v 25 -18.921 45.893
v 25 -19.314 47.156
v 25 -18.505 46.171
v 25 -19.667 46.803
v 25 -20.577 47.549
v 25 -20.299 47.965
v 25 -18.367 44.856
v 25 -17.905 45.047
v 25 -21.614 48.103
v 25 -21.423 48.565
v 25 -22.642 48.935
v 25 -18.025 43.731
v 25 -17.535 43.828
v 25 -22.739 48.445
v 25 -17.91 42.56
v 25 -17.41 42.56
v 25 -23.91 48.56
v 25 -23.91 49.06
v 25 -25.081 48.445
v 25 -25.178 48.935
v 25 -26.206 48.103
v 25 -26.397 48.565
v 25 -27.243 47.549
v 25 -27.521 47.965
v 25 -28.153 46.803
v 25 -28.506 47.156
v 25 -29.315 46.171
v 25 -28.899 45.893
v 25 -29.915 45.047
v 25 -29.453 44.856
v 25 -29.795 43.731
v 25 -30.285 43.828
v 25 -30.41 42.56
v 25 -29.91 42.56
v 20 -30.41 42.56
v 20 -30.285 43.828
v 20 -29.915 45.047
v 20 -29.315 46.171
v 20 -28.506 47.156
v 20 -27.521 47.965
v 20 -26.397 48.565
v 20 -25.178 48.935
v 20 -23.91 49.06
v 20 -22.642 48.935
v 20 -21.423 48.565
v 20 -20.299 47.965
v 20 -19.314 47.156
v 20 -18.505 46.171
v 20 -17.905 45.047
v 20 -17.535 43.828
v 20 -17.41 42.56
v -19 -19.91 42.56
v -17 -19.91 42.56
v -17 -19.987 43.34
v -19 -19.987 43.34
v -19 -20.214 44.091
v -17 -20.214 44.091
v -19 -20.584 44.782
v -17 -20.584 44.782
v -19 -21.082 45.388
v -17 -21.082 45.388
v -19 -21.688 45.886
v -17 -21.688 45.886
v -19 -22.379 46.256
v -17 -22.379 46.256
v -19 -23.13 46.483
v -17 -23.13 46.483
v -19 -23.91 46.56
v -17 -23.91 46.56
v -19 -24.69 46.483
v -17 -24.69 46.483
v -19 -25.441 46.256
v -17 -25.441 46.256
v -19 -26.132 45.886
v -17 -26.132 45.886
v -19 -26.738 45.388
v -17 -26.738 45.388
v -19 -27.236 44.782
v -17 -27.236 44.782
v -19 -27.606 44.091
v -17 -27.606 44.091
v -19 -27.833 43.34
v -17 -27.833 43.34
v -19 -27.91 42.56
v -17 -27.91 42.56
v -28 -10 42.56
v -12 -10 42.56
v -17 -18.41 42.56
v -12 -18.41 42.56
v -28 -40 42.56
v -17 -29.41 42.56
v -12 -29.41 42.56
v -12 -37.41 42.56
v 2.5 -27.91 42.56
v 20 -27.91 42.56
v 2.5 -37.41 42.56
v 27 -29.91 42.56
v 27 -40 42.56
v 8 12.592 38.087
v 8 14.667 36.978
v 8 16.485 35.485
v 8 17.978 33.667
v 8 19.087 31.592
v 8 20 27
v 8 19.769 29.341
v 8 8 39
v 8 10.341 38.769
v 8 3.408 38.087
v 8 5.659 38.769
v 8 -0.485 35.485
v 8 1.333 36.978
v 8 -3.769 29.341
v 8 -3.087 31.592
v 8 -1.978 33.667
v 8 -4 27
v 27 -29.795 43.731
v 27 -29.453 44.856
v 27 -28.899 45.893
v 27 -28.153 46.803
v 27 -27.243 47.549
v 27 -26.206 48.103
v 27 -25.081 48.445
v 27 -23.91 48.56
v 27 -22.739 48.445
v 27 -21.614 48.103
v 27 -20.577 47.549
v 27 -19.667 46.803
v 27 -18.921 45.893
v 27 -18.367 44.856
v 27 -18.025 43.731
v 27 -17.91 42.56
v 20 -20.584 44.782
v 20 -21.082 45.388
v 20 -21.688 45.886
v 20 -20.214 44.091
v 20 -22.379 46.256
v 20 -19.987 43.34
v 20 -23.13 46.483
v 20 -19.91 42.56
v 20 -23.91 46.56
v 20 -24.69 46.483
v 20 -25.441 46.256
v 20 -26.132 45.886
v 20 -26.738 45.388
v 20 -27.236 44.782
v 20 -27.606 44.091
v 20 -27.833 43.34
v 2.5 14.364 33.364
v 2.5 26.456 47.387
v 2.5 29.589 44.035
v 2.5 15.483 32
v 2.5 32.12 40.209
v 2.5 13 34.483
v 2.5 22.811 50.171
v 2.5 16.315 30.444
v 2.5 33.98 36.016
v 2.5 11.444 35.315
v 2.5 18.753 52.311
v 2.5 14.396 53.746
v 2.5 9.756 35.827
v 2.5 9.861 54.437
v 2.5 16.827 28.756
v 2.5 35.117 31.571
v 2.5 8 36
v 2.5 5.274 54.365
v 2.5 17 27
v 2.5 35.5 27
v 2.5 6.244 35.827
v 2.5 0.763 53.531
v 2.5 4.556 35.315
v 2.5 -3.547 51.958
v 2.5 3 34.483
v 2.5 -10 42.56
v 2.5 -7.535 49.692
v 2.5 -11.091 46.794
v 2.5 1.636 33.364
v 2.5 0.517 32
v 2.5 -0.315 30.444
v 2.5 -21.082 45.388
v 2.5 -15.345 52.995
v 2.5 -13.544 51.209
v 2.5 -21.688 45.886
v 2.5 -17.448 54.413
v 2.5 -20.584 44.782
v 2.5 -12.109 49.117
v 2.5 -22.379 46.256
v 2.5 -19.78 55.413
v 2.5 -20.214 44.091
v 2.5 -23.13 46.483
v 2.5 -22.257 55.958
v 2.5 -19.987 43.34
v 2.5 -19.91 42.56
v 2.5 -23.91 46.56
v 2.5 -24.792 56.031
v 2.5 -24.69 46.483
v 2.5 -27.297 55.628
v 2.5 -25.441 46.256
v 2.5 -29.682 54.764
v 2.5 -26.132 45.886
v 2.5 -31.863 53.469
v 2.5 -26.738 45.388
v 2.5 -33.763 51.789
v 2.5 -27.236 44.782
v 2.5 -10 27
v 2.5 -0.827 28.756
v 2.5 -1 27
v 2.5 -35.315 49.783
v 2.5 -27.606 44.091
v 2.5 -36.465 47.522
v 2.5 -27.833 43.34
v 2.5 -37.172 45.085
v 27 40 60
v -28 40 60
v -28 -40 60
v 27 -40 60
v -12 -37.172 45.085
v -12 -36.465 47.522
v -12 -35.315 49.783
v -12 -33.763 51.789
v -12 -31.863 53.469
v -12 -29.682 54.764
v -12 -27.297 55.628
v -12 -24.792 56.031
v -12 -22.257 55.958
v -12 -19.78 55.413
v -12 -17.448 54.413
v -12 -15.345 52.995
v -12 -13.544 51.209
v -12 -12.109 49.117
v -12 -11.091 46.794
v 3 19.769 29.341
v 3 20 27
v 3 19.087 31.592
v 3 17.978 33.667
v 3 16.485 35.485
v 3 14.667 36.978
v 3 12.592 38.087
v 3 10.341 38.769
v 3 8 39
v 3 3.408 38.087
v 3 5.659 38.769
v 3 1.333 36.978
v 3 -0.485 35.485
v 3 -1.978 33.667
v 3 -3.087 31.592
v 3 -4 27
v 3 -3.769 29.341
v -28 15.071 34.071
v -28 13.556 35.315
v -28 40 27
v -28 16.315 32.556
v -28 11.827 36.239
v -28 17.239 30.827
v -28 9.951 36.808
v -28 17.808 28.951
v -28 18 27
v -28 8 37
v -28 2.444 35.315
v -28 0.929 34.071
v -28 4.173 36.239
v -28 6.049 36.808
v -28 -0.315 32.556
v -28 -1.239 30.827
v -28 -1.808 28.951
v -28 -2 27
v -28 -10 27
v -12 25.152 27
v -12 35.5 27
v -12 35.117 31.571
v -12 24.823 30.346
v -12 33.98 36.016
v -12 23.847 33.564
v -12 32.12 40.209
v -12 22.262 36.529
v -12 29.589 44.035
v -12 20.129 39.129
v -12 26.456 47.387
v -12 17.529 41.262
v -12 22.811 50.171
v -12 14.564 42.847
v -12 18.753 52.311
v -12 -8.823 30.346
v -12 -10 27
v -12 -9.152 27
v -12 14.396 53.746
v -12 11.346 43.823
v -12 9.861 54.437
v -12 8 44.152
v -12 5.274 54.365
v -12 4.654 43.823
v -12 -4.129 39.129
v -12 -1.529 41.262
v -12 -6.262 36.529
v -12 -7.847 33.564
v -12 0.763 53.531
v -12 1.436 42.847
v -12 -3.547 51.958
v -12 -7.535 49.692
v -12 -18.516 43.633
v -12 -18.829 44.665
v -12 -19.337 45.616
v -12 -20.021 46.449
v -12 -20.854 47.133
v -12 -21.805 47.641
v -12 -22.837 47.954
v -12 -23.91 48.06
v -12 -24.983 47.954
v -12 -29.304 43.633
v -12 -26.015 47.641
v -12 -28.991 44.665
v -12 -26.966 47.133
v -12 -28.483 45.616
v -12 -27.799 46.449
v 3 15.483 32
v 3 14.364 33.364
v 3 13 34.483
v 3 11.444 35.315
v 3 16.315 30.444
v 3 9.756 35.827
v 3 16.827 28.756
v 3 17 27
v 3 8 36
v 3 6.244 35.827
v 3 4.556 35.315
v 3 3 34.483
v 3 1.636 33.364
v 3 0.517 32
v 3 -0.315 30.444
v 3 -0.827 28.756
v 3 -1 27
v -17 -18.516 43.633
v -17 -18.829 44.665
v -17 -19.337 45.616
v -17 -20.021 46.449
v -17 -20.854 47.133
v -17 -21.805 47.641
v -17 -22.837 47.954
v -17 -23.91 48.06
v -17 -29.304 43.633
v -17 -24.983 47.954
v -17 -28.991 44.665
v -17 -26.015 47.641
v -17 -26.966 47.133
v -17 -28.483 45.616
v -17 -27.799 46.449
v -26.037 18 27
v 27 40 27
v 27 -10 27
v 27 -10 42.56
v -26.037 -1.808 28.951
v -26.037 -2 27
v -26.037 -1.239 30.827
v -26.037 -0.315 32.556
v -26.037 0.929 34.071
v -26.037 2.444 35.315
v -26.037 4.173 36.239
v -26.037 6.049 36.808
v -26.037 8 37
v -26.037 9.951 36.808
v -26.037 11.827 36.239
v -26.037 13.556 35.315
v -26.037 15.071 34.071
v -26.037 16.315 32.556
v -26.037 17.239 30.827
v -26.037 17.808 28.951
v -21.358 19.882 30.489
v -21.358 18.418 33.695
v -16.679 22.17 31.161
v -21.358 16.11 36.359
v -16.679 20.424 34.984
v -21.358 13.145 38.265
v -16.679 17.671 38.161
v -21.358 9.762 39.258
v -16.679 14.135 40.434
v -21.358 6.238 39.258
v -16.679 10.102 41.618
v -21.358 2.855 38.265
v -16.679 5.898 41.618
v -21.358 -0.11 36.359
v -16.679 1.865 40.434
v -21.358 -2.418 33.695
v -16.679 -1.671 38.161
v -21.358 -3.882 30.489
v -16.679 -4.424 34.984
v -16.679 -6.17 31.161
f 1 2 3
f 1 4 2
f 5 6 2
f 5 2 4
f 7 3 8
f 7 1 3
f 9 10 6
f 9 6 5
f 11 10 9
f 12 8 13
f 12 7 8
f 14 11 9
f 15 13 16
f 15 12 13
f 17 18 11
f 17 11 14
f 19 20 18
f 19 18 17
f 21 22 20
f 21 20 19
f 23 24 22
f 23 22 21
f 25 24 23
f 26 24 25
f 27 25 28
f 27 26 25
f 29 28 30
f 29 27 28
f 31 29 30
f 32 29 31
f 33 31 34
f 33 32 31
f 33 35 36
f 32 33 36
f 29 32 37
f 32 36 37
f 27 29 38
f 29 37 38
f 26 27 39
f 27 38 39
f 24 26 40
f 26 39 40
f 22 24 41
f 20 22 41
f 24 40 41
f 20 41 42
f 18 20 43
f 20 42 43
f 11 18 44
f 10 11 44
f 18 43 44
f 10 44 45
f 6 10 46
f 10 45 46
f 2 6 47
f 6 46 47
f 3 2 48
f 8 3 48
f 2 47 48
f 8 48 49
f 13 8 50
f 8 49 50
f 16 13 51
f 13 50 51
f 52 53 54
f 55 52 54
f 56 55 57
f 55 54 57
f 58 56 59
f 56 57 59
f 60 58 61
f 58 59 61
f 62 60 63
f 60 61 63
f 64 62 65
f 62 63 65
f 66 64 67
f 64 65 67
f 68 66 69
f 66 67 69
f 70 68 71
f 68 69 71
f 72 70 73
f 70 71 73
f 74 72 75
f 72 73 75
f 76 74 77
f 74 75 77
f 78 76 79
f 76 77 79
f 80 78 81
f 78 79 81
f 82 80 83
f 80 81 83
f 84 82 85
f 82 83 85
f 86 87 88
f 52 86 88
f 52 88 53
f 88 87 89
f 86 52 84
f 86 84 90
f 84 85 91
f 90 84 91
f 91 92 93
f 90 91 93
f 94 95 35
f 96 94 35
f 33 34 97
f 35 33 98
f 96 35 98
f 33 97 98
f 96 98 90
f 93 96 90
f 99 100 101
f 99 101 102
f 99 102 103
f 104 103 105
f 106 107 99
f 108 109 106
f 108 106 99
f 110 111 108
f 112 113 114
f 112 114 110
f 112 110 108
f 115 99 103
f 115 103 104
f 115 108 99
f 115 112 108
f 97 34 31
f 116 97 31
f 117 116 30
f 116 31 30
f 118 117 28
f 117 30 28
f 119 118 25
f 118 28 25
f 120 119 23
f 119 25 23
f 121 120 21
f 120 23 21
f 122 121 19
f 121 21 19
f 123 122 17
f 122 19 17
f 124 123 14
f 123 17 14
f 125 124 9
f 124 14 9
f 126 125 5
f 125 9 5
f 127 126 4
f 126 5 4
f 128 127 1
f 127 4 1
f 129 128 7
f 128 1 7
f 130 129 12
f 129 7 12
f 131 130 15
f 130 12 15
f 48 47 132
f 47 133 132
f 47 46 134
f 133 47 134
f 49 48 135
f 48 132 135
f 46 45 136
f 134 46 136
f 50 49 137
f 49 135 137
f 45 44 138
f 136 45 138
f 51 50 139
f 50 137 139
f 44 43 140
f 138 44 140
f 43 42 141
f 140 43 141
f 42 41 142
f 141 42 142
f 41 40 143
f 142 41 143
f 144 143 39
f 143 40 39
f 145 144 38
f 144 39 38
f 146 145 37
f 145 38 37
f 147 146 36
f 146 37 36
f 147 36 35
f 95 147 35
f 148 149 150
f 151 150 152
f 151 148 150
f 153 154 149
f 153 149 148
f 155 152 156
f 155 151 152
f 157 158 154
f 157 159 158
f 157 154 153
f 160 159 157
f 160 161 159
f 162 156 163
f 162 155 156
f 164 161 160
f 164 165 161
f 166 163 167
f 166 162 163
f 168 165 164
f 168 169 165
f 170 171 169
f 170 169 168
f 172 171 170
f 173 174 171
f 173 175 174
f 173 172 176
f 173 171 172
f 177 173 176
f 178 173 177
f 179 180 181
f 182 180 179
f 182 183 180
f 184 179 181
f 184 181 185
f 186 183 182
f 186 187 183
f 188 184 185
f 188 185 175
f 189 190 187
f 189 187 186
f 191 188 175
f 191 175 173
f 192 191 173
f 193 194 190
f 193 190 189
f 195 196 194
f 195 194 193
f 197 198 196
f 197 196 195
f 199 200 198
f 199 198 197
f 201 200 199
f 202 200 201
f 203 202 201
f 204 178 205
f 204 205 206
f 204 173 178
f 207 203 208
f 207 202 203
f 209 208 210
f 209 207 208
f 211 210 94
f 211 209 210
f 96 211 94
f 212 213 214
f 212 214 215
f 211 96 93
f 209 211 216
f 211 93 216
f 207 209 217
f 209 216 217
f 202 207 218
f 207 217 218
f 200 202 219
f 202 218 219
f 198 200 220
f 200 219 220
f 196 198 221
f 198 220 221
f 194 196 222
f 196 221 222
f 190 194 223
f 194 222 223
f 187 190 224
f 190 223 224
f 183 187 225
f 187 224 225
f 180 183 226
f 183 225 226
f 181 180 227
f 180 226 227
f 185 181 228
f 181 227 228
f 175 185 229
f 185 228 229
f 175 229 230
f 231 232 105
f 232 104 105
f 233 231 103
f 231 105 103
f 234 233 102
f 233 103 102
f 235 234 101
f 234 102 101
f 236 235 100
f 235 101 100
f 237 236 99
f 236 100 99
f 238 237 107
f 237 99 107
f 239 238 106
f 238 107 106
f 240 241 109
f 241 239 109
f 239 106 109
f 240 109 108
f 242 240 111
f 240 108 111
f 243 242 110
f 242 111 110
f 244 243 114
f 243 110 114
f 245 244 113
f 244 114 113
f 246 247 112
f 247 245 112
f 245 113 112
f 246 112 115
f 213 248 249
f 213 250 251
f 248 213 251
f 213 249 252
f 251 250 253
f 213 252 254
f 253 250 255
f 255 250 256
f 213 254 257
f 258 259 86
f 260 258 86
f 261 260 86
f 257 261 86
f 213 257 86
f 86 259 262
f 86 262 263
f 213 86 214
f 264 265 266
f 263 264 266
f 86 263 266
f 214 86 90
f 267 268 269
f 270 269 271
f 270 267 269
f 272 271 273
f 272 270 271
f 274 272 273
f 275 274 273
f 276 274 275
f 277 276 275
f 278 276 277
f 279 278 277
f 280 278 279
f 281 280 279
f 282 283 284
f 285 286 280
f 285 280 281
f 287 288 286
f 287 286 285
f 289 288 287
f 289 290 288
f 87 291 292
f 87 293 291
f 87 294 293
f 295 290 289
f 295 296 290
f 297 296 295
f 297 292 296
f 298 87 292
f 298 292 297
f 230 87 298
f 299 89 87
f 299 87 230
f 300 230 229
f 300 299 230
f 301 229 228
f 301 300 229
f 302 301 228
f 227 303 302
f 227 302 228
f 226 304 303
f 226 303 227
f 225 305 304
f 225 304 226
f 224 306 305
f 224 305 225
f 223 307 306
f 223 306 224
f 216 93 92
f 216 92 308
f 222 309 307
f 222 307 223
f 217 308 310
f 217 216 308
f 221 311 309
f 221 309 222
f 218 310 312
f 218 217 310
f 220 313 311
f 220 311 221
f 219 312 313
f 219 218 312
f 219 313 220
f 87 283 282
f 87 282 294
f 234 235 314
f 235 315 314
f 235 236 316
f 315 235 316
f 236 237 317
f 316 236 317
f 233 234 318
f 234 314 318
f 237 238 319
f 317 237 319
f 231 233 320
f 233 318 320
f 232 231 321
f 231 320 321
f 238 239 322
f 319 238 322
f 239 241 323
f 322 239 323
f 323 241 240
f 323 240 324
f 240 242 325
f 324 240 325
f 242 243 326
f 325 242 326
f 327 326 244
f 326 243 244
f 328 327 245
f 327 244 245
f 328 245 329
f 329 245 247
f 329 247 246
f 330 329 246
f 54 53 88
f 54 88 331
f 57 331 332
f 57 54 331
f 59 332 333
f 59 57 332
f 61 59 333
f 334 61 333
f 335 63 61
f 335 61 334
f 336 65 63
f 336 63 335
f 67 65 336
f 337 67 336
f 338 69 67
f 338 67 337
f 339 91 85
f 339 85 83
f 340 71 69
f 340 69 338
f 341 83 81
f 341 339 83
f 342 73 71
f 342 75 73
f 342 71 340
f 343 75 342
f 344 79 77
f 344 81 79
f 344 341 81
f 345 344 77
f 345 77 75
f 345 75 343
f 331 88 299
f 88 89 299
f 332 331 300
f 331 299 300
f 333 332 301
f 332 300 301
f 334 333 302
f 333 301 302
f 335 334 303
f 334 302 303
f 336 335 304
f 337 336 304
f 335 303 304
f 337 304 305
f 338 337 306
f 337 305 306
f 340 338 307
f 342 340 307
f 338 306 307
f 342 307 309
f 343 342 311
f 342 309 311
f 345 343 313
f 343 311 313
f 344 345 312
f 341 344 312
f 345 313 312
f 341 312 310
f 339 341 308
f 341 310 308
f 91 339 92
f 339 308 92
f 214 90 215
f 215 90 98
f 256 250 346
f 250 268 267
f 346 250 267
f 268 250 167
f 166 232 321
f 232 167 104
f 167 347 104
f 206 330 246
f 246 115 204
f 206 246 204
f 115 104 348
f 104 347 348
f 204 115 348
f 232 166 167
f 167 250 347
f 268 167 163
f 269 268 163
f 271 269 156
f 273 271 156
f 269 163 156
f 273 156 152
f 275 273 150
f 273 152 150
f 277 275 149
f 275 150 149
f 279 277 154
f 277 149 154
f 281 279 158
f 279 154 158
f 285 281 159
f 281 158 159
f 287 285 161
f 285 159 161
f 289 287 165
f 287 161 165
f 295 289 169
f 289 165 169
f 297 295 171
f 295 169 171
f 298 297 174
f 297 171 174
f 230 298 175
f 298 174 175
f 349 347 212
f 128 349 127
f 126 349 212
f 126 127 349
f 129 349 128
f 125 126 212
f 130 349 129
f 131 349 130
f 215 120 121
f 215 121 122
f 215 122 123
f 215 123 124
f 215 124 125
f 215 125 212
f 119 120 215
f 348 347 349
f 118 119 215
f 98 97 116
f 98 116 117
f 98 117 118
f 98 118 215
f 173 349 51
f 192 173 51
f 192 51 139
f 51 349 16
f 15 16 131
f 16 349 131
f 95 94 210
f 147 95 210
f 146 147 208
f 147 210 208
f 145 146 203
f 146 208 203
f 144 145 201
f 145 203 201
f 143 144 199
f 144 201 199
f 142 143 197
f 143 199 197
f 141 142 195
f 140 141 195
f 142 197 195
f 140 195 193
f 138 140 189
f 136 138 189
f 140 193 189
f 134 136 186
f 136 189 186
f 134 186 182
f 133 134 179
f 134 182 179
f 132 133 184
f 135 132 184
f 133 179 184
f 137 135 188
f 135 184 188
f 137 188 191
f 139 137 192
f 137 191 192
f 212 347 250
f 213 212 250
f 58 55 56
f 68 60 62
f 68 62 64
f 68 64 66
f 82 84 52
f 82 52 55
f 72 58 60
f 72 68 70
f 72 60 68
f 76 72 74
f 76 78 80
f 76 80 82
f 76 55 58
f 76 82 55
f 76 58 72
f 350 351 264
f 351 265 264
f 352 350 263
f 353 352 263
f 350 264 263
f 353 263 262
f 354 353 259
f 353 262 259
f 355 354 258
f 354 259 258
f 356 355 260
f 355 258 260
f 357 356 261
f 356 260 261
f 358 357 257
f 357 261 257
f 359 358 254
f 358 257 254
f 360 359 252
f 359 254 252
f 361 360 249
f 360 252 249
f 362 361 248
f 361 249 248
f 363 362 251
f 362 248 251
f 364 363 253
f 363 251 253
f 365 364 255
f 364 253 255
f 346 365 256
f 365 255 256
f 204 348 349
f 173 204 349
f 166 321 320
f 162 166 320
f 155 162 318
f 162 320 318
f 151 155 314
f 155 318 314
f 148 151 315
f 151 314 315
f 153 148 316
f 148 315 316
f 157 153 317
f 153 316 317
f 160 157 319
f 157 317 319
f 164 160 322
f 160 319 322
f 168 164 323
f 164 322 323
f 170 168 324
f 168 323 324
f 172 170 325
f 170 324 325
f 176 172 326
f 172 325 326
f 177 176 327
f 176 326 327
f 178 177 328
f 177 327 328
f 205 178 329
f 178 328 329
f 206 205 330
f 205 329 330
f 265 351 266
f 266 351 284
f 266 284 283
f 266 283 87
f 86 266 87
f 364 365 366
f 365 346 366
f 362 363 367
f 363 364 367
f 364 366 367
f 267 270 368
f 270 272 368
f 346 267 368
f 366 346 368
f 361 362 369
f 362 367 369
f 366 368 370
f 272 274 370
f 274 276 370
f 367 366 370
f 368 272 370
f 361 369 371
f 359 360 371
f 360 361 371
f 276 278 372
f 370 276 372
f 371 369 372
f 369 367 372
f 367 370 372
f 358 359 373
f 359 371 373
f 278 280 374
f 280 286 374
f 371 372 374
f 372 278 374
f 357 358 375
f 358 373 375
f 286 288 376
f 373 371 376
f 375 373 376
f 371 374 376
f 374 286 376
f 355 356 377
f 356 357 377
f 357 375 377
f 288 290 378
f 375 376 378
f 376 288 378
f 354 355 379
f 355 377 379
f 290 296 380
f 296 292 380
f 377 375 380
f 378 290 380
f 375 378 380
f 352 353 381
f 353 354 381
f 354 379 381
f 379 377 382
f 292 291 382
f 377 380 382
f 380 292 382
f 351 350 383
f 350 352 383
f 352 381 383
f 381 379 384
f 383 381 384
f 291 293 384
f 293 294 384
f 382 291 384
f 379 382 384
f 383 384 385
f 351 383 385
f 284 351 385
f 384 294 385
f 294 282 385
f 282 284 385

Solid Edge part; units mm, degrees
sketch "Sketch1" plane through (0, 0, 0) normal (0, 0, 1) x (1, 0, 0)
  line L0 (-28, -40) -> (28, -40)
  line L1 (28, -40) -> (28, 40)
  line L2 (28, 40) -> (-28, 40)
  line L3 (-28, 40) -> (-28, -40)
  dimension "D1" = 56
  dimension "D2" = 80
extrude "Protrusion1" add sketch "Sketch1" along normal blind 60
sketch "Sketch2" plane through (8, 0, 21.28) normal (-1, 0, 0) x (0, -1, 0)
  circle A0 centre (-8, 5.72) radius 12
  dimension "D1" = 24
  dimension "D2" = 32
extrude "Extrusionsausschnitt_3" cut sketch "Sketch2" along normal blind 5
sketch "Sketch3" plane through (3, 5.5, 20.5) normal (1, 0, 0) x (0, 1, 0)
  circle A0 centre (2.5, 6.5) radius 9
  dimension "D1" = 18
  dimension "D2" = 32
extrude "Extrusionsausschnitt_4" cut sketch "Sketch3" against normal blind 1.5
sketch "Sketch4" plane through (1.5, 5.5, 22.5) normal (1, 0, 0) x (0, 1, 0)
  circle A0 centre (2.5, 4.5) radius 27.5
  dimension "D1" = 55
  dimension "D2" = 32
extrude "Extrusionsausschnitt_5" cut sketch "Sketch4" against normal blind 13.5
sketch "Sketch5" plane through (1.5, 5.5, 21.28) normal (-1, 0, 0) x (0, 0, 1)
  circle A0 centre (5.72, 2.5) radius 27.5
  dimension "D1" = 55
  dimension "D2" = 32
extrude "Extrusionsausschnitt_6" cut sketch "Sketch5" against normal blind 1
sketch "Sketch6" plane through (0, 15, 27) normal (0, 0, 1) x (1, 0, 0)
  line L0 (-12, 10.1524) -> (-28, 2)
  line L1 (-12, 10.1524) -> (-12, -7)
revolve "RevolvedCutout1" cut sketch "Sketch6" angle 360 about axis through (-28, 8, 27) along (1, 0, 0) material side at (-19.9773, 21.0316, 27)
sketch "Sketch7" plane through (-28, 0, 21.28) normal (-1, 0, 0) x (0, -1, 0)
  circle A0 centre (-8, 5.72) radius 10
  dimension "D1" = 20
extrude "Cutout1" cut sketch "Sketch7" against normal up to vertex (16 mm away)
sketch "Sketch8" plane through (-12, 0, 21.28) normal (-1, 0, 0) x (0, 0, 1)
  circle A0 centre (21.28, -23.91) radius 13.5
  dimension "D1" = 16.09
  dimension "D2" = 17.44
  dimension "D3" = 27
extrude "Extrusionsausschnitt_8" cut sketch "Sketch8" against normal up to vertex (14.5 mm away)
sketch "Sketch9" plane through (-12, -0.75, 21.28) normal (1, 0, 0) x (0, 1, 0)
  circle A0 centre (-23.16, 21.28) radius 5.5
  dimension "D1" = 11
  dimension "D2" = 16.09
extrude "Extrusionsausschnitt_9" cut sketch "Sketch9" against normal blind 5
sketch "Sketch10" plane through (-17, -23.91, 39.81) normal (1, 0, 0) x (0, 1, 0)
  circle A0 centre (0, 2.75) radius 4
  dimension "D1" = 8
  dimension "D2" = 16.09
extrude "Extrusionsausschnitt_10" cut sketch "Sketch10" against normal blind 2
sketch "Sketch11" plane through (2.5, -0.75, 21.28) normal (-1, 0, 0) x (0, -1, 0)
  circle A0 centre (23.16, 21.28) radius 4
  dimension "D1" = 8
  dimension "D2" = 16.09
extrude "Extrusionsausschnitt_11" cut sketch "Sketch11" against normal blind 17.5
sketch "Sketch12" plane through (20, -23.91, 40.56) normal (-1, 0, 0) x (0, -1, 0)
  circle A0 centre (0, 2) radius 6.5
  dimension "D1" = 13
  dimension "D2" = 16.09
extrude "Extrusionsausschnitt_12" cut sketch "Sketch12" against normal blind 5
sketch "Sketch13" plane through (25, -23.91, 38.81) normal (-1, 0, 0) x (0, -1, 0)
  circle A0 centre (0, 3.75) radius 6
  dimension "D1" = 12
  dimension "D2" = 16.09
extrude "Extrusionsausschnitt_13" cut sketch "Sketch13" against normal blind 24
sketch "Sketch14" plane through (28, 0, 21.28) normal (1, 0, 0) x (0, 1, 0)
  circle A0 centre (-23.6974, 21.295) radius 9.5
  dimension "D1" = 19
extrude "Extrusionsausschnitt_14" cut sketch "Sketch14" against normal blind 1
sketch "Sketch15" plane through (15.25, -14.955, 42.56) normal (0, 0, 1) x (1, 0, 0)
  line L0 (11.75, 54.955) -> (11.75, -25.045)
  dimension "D1" = 1
extrude "Extrusionsausschnitt_15" cut sketch "Sketch15" along normal mid plane 96 material side at (27.05, 0, 42.56)
sketch "Sketch16" plane through (27, 0, 30) normal (1, 0, 0) x (0, 1, 0)
  line L0 (40, -3) -> (-10, -3)
  line L1 (-10, -3) -> (-10, 12.56)
  line L2 (-10, 12.56) -> (-40, 12.56)
  dimension "D1" = 42.56
  dimension "D2" = 50
  dimension "D3" = 27
extrude "Extrusionsausschnitt_16" cut sketch "Sketch16" against normal blind 80 material side at (27, 15, 26.95)
properties material "Aluminiumlegierung:3.0205, Al 99.0, EN-AW 1200"
